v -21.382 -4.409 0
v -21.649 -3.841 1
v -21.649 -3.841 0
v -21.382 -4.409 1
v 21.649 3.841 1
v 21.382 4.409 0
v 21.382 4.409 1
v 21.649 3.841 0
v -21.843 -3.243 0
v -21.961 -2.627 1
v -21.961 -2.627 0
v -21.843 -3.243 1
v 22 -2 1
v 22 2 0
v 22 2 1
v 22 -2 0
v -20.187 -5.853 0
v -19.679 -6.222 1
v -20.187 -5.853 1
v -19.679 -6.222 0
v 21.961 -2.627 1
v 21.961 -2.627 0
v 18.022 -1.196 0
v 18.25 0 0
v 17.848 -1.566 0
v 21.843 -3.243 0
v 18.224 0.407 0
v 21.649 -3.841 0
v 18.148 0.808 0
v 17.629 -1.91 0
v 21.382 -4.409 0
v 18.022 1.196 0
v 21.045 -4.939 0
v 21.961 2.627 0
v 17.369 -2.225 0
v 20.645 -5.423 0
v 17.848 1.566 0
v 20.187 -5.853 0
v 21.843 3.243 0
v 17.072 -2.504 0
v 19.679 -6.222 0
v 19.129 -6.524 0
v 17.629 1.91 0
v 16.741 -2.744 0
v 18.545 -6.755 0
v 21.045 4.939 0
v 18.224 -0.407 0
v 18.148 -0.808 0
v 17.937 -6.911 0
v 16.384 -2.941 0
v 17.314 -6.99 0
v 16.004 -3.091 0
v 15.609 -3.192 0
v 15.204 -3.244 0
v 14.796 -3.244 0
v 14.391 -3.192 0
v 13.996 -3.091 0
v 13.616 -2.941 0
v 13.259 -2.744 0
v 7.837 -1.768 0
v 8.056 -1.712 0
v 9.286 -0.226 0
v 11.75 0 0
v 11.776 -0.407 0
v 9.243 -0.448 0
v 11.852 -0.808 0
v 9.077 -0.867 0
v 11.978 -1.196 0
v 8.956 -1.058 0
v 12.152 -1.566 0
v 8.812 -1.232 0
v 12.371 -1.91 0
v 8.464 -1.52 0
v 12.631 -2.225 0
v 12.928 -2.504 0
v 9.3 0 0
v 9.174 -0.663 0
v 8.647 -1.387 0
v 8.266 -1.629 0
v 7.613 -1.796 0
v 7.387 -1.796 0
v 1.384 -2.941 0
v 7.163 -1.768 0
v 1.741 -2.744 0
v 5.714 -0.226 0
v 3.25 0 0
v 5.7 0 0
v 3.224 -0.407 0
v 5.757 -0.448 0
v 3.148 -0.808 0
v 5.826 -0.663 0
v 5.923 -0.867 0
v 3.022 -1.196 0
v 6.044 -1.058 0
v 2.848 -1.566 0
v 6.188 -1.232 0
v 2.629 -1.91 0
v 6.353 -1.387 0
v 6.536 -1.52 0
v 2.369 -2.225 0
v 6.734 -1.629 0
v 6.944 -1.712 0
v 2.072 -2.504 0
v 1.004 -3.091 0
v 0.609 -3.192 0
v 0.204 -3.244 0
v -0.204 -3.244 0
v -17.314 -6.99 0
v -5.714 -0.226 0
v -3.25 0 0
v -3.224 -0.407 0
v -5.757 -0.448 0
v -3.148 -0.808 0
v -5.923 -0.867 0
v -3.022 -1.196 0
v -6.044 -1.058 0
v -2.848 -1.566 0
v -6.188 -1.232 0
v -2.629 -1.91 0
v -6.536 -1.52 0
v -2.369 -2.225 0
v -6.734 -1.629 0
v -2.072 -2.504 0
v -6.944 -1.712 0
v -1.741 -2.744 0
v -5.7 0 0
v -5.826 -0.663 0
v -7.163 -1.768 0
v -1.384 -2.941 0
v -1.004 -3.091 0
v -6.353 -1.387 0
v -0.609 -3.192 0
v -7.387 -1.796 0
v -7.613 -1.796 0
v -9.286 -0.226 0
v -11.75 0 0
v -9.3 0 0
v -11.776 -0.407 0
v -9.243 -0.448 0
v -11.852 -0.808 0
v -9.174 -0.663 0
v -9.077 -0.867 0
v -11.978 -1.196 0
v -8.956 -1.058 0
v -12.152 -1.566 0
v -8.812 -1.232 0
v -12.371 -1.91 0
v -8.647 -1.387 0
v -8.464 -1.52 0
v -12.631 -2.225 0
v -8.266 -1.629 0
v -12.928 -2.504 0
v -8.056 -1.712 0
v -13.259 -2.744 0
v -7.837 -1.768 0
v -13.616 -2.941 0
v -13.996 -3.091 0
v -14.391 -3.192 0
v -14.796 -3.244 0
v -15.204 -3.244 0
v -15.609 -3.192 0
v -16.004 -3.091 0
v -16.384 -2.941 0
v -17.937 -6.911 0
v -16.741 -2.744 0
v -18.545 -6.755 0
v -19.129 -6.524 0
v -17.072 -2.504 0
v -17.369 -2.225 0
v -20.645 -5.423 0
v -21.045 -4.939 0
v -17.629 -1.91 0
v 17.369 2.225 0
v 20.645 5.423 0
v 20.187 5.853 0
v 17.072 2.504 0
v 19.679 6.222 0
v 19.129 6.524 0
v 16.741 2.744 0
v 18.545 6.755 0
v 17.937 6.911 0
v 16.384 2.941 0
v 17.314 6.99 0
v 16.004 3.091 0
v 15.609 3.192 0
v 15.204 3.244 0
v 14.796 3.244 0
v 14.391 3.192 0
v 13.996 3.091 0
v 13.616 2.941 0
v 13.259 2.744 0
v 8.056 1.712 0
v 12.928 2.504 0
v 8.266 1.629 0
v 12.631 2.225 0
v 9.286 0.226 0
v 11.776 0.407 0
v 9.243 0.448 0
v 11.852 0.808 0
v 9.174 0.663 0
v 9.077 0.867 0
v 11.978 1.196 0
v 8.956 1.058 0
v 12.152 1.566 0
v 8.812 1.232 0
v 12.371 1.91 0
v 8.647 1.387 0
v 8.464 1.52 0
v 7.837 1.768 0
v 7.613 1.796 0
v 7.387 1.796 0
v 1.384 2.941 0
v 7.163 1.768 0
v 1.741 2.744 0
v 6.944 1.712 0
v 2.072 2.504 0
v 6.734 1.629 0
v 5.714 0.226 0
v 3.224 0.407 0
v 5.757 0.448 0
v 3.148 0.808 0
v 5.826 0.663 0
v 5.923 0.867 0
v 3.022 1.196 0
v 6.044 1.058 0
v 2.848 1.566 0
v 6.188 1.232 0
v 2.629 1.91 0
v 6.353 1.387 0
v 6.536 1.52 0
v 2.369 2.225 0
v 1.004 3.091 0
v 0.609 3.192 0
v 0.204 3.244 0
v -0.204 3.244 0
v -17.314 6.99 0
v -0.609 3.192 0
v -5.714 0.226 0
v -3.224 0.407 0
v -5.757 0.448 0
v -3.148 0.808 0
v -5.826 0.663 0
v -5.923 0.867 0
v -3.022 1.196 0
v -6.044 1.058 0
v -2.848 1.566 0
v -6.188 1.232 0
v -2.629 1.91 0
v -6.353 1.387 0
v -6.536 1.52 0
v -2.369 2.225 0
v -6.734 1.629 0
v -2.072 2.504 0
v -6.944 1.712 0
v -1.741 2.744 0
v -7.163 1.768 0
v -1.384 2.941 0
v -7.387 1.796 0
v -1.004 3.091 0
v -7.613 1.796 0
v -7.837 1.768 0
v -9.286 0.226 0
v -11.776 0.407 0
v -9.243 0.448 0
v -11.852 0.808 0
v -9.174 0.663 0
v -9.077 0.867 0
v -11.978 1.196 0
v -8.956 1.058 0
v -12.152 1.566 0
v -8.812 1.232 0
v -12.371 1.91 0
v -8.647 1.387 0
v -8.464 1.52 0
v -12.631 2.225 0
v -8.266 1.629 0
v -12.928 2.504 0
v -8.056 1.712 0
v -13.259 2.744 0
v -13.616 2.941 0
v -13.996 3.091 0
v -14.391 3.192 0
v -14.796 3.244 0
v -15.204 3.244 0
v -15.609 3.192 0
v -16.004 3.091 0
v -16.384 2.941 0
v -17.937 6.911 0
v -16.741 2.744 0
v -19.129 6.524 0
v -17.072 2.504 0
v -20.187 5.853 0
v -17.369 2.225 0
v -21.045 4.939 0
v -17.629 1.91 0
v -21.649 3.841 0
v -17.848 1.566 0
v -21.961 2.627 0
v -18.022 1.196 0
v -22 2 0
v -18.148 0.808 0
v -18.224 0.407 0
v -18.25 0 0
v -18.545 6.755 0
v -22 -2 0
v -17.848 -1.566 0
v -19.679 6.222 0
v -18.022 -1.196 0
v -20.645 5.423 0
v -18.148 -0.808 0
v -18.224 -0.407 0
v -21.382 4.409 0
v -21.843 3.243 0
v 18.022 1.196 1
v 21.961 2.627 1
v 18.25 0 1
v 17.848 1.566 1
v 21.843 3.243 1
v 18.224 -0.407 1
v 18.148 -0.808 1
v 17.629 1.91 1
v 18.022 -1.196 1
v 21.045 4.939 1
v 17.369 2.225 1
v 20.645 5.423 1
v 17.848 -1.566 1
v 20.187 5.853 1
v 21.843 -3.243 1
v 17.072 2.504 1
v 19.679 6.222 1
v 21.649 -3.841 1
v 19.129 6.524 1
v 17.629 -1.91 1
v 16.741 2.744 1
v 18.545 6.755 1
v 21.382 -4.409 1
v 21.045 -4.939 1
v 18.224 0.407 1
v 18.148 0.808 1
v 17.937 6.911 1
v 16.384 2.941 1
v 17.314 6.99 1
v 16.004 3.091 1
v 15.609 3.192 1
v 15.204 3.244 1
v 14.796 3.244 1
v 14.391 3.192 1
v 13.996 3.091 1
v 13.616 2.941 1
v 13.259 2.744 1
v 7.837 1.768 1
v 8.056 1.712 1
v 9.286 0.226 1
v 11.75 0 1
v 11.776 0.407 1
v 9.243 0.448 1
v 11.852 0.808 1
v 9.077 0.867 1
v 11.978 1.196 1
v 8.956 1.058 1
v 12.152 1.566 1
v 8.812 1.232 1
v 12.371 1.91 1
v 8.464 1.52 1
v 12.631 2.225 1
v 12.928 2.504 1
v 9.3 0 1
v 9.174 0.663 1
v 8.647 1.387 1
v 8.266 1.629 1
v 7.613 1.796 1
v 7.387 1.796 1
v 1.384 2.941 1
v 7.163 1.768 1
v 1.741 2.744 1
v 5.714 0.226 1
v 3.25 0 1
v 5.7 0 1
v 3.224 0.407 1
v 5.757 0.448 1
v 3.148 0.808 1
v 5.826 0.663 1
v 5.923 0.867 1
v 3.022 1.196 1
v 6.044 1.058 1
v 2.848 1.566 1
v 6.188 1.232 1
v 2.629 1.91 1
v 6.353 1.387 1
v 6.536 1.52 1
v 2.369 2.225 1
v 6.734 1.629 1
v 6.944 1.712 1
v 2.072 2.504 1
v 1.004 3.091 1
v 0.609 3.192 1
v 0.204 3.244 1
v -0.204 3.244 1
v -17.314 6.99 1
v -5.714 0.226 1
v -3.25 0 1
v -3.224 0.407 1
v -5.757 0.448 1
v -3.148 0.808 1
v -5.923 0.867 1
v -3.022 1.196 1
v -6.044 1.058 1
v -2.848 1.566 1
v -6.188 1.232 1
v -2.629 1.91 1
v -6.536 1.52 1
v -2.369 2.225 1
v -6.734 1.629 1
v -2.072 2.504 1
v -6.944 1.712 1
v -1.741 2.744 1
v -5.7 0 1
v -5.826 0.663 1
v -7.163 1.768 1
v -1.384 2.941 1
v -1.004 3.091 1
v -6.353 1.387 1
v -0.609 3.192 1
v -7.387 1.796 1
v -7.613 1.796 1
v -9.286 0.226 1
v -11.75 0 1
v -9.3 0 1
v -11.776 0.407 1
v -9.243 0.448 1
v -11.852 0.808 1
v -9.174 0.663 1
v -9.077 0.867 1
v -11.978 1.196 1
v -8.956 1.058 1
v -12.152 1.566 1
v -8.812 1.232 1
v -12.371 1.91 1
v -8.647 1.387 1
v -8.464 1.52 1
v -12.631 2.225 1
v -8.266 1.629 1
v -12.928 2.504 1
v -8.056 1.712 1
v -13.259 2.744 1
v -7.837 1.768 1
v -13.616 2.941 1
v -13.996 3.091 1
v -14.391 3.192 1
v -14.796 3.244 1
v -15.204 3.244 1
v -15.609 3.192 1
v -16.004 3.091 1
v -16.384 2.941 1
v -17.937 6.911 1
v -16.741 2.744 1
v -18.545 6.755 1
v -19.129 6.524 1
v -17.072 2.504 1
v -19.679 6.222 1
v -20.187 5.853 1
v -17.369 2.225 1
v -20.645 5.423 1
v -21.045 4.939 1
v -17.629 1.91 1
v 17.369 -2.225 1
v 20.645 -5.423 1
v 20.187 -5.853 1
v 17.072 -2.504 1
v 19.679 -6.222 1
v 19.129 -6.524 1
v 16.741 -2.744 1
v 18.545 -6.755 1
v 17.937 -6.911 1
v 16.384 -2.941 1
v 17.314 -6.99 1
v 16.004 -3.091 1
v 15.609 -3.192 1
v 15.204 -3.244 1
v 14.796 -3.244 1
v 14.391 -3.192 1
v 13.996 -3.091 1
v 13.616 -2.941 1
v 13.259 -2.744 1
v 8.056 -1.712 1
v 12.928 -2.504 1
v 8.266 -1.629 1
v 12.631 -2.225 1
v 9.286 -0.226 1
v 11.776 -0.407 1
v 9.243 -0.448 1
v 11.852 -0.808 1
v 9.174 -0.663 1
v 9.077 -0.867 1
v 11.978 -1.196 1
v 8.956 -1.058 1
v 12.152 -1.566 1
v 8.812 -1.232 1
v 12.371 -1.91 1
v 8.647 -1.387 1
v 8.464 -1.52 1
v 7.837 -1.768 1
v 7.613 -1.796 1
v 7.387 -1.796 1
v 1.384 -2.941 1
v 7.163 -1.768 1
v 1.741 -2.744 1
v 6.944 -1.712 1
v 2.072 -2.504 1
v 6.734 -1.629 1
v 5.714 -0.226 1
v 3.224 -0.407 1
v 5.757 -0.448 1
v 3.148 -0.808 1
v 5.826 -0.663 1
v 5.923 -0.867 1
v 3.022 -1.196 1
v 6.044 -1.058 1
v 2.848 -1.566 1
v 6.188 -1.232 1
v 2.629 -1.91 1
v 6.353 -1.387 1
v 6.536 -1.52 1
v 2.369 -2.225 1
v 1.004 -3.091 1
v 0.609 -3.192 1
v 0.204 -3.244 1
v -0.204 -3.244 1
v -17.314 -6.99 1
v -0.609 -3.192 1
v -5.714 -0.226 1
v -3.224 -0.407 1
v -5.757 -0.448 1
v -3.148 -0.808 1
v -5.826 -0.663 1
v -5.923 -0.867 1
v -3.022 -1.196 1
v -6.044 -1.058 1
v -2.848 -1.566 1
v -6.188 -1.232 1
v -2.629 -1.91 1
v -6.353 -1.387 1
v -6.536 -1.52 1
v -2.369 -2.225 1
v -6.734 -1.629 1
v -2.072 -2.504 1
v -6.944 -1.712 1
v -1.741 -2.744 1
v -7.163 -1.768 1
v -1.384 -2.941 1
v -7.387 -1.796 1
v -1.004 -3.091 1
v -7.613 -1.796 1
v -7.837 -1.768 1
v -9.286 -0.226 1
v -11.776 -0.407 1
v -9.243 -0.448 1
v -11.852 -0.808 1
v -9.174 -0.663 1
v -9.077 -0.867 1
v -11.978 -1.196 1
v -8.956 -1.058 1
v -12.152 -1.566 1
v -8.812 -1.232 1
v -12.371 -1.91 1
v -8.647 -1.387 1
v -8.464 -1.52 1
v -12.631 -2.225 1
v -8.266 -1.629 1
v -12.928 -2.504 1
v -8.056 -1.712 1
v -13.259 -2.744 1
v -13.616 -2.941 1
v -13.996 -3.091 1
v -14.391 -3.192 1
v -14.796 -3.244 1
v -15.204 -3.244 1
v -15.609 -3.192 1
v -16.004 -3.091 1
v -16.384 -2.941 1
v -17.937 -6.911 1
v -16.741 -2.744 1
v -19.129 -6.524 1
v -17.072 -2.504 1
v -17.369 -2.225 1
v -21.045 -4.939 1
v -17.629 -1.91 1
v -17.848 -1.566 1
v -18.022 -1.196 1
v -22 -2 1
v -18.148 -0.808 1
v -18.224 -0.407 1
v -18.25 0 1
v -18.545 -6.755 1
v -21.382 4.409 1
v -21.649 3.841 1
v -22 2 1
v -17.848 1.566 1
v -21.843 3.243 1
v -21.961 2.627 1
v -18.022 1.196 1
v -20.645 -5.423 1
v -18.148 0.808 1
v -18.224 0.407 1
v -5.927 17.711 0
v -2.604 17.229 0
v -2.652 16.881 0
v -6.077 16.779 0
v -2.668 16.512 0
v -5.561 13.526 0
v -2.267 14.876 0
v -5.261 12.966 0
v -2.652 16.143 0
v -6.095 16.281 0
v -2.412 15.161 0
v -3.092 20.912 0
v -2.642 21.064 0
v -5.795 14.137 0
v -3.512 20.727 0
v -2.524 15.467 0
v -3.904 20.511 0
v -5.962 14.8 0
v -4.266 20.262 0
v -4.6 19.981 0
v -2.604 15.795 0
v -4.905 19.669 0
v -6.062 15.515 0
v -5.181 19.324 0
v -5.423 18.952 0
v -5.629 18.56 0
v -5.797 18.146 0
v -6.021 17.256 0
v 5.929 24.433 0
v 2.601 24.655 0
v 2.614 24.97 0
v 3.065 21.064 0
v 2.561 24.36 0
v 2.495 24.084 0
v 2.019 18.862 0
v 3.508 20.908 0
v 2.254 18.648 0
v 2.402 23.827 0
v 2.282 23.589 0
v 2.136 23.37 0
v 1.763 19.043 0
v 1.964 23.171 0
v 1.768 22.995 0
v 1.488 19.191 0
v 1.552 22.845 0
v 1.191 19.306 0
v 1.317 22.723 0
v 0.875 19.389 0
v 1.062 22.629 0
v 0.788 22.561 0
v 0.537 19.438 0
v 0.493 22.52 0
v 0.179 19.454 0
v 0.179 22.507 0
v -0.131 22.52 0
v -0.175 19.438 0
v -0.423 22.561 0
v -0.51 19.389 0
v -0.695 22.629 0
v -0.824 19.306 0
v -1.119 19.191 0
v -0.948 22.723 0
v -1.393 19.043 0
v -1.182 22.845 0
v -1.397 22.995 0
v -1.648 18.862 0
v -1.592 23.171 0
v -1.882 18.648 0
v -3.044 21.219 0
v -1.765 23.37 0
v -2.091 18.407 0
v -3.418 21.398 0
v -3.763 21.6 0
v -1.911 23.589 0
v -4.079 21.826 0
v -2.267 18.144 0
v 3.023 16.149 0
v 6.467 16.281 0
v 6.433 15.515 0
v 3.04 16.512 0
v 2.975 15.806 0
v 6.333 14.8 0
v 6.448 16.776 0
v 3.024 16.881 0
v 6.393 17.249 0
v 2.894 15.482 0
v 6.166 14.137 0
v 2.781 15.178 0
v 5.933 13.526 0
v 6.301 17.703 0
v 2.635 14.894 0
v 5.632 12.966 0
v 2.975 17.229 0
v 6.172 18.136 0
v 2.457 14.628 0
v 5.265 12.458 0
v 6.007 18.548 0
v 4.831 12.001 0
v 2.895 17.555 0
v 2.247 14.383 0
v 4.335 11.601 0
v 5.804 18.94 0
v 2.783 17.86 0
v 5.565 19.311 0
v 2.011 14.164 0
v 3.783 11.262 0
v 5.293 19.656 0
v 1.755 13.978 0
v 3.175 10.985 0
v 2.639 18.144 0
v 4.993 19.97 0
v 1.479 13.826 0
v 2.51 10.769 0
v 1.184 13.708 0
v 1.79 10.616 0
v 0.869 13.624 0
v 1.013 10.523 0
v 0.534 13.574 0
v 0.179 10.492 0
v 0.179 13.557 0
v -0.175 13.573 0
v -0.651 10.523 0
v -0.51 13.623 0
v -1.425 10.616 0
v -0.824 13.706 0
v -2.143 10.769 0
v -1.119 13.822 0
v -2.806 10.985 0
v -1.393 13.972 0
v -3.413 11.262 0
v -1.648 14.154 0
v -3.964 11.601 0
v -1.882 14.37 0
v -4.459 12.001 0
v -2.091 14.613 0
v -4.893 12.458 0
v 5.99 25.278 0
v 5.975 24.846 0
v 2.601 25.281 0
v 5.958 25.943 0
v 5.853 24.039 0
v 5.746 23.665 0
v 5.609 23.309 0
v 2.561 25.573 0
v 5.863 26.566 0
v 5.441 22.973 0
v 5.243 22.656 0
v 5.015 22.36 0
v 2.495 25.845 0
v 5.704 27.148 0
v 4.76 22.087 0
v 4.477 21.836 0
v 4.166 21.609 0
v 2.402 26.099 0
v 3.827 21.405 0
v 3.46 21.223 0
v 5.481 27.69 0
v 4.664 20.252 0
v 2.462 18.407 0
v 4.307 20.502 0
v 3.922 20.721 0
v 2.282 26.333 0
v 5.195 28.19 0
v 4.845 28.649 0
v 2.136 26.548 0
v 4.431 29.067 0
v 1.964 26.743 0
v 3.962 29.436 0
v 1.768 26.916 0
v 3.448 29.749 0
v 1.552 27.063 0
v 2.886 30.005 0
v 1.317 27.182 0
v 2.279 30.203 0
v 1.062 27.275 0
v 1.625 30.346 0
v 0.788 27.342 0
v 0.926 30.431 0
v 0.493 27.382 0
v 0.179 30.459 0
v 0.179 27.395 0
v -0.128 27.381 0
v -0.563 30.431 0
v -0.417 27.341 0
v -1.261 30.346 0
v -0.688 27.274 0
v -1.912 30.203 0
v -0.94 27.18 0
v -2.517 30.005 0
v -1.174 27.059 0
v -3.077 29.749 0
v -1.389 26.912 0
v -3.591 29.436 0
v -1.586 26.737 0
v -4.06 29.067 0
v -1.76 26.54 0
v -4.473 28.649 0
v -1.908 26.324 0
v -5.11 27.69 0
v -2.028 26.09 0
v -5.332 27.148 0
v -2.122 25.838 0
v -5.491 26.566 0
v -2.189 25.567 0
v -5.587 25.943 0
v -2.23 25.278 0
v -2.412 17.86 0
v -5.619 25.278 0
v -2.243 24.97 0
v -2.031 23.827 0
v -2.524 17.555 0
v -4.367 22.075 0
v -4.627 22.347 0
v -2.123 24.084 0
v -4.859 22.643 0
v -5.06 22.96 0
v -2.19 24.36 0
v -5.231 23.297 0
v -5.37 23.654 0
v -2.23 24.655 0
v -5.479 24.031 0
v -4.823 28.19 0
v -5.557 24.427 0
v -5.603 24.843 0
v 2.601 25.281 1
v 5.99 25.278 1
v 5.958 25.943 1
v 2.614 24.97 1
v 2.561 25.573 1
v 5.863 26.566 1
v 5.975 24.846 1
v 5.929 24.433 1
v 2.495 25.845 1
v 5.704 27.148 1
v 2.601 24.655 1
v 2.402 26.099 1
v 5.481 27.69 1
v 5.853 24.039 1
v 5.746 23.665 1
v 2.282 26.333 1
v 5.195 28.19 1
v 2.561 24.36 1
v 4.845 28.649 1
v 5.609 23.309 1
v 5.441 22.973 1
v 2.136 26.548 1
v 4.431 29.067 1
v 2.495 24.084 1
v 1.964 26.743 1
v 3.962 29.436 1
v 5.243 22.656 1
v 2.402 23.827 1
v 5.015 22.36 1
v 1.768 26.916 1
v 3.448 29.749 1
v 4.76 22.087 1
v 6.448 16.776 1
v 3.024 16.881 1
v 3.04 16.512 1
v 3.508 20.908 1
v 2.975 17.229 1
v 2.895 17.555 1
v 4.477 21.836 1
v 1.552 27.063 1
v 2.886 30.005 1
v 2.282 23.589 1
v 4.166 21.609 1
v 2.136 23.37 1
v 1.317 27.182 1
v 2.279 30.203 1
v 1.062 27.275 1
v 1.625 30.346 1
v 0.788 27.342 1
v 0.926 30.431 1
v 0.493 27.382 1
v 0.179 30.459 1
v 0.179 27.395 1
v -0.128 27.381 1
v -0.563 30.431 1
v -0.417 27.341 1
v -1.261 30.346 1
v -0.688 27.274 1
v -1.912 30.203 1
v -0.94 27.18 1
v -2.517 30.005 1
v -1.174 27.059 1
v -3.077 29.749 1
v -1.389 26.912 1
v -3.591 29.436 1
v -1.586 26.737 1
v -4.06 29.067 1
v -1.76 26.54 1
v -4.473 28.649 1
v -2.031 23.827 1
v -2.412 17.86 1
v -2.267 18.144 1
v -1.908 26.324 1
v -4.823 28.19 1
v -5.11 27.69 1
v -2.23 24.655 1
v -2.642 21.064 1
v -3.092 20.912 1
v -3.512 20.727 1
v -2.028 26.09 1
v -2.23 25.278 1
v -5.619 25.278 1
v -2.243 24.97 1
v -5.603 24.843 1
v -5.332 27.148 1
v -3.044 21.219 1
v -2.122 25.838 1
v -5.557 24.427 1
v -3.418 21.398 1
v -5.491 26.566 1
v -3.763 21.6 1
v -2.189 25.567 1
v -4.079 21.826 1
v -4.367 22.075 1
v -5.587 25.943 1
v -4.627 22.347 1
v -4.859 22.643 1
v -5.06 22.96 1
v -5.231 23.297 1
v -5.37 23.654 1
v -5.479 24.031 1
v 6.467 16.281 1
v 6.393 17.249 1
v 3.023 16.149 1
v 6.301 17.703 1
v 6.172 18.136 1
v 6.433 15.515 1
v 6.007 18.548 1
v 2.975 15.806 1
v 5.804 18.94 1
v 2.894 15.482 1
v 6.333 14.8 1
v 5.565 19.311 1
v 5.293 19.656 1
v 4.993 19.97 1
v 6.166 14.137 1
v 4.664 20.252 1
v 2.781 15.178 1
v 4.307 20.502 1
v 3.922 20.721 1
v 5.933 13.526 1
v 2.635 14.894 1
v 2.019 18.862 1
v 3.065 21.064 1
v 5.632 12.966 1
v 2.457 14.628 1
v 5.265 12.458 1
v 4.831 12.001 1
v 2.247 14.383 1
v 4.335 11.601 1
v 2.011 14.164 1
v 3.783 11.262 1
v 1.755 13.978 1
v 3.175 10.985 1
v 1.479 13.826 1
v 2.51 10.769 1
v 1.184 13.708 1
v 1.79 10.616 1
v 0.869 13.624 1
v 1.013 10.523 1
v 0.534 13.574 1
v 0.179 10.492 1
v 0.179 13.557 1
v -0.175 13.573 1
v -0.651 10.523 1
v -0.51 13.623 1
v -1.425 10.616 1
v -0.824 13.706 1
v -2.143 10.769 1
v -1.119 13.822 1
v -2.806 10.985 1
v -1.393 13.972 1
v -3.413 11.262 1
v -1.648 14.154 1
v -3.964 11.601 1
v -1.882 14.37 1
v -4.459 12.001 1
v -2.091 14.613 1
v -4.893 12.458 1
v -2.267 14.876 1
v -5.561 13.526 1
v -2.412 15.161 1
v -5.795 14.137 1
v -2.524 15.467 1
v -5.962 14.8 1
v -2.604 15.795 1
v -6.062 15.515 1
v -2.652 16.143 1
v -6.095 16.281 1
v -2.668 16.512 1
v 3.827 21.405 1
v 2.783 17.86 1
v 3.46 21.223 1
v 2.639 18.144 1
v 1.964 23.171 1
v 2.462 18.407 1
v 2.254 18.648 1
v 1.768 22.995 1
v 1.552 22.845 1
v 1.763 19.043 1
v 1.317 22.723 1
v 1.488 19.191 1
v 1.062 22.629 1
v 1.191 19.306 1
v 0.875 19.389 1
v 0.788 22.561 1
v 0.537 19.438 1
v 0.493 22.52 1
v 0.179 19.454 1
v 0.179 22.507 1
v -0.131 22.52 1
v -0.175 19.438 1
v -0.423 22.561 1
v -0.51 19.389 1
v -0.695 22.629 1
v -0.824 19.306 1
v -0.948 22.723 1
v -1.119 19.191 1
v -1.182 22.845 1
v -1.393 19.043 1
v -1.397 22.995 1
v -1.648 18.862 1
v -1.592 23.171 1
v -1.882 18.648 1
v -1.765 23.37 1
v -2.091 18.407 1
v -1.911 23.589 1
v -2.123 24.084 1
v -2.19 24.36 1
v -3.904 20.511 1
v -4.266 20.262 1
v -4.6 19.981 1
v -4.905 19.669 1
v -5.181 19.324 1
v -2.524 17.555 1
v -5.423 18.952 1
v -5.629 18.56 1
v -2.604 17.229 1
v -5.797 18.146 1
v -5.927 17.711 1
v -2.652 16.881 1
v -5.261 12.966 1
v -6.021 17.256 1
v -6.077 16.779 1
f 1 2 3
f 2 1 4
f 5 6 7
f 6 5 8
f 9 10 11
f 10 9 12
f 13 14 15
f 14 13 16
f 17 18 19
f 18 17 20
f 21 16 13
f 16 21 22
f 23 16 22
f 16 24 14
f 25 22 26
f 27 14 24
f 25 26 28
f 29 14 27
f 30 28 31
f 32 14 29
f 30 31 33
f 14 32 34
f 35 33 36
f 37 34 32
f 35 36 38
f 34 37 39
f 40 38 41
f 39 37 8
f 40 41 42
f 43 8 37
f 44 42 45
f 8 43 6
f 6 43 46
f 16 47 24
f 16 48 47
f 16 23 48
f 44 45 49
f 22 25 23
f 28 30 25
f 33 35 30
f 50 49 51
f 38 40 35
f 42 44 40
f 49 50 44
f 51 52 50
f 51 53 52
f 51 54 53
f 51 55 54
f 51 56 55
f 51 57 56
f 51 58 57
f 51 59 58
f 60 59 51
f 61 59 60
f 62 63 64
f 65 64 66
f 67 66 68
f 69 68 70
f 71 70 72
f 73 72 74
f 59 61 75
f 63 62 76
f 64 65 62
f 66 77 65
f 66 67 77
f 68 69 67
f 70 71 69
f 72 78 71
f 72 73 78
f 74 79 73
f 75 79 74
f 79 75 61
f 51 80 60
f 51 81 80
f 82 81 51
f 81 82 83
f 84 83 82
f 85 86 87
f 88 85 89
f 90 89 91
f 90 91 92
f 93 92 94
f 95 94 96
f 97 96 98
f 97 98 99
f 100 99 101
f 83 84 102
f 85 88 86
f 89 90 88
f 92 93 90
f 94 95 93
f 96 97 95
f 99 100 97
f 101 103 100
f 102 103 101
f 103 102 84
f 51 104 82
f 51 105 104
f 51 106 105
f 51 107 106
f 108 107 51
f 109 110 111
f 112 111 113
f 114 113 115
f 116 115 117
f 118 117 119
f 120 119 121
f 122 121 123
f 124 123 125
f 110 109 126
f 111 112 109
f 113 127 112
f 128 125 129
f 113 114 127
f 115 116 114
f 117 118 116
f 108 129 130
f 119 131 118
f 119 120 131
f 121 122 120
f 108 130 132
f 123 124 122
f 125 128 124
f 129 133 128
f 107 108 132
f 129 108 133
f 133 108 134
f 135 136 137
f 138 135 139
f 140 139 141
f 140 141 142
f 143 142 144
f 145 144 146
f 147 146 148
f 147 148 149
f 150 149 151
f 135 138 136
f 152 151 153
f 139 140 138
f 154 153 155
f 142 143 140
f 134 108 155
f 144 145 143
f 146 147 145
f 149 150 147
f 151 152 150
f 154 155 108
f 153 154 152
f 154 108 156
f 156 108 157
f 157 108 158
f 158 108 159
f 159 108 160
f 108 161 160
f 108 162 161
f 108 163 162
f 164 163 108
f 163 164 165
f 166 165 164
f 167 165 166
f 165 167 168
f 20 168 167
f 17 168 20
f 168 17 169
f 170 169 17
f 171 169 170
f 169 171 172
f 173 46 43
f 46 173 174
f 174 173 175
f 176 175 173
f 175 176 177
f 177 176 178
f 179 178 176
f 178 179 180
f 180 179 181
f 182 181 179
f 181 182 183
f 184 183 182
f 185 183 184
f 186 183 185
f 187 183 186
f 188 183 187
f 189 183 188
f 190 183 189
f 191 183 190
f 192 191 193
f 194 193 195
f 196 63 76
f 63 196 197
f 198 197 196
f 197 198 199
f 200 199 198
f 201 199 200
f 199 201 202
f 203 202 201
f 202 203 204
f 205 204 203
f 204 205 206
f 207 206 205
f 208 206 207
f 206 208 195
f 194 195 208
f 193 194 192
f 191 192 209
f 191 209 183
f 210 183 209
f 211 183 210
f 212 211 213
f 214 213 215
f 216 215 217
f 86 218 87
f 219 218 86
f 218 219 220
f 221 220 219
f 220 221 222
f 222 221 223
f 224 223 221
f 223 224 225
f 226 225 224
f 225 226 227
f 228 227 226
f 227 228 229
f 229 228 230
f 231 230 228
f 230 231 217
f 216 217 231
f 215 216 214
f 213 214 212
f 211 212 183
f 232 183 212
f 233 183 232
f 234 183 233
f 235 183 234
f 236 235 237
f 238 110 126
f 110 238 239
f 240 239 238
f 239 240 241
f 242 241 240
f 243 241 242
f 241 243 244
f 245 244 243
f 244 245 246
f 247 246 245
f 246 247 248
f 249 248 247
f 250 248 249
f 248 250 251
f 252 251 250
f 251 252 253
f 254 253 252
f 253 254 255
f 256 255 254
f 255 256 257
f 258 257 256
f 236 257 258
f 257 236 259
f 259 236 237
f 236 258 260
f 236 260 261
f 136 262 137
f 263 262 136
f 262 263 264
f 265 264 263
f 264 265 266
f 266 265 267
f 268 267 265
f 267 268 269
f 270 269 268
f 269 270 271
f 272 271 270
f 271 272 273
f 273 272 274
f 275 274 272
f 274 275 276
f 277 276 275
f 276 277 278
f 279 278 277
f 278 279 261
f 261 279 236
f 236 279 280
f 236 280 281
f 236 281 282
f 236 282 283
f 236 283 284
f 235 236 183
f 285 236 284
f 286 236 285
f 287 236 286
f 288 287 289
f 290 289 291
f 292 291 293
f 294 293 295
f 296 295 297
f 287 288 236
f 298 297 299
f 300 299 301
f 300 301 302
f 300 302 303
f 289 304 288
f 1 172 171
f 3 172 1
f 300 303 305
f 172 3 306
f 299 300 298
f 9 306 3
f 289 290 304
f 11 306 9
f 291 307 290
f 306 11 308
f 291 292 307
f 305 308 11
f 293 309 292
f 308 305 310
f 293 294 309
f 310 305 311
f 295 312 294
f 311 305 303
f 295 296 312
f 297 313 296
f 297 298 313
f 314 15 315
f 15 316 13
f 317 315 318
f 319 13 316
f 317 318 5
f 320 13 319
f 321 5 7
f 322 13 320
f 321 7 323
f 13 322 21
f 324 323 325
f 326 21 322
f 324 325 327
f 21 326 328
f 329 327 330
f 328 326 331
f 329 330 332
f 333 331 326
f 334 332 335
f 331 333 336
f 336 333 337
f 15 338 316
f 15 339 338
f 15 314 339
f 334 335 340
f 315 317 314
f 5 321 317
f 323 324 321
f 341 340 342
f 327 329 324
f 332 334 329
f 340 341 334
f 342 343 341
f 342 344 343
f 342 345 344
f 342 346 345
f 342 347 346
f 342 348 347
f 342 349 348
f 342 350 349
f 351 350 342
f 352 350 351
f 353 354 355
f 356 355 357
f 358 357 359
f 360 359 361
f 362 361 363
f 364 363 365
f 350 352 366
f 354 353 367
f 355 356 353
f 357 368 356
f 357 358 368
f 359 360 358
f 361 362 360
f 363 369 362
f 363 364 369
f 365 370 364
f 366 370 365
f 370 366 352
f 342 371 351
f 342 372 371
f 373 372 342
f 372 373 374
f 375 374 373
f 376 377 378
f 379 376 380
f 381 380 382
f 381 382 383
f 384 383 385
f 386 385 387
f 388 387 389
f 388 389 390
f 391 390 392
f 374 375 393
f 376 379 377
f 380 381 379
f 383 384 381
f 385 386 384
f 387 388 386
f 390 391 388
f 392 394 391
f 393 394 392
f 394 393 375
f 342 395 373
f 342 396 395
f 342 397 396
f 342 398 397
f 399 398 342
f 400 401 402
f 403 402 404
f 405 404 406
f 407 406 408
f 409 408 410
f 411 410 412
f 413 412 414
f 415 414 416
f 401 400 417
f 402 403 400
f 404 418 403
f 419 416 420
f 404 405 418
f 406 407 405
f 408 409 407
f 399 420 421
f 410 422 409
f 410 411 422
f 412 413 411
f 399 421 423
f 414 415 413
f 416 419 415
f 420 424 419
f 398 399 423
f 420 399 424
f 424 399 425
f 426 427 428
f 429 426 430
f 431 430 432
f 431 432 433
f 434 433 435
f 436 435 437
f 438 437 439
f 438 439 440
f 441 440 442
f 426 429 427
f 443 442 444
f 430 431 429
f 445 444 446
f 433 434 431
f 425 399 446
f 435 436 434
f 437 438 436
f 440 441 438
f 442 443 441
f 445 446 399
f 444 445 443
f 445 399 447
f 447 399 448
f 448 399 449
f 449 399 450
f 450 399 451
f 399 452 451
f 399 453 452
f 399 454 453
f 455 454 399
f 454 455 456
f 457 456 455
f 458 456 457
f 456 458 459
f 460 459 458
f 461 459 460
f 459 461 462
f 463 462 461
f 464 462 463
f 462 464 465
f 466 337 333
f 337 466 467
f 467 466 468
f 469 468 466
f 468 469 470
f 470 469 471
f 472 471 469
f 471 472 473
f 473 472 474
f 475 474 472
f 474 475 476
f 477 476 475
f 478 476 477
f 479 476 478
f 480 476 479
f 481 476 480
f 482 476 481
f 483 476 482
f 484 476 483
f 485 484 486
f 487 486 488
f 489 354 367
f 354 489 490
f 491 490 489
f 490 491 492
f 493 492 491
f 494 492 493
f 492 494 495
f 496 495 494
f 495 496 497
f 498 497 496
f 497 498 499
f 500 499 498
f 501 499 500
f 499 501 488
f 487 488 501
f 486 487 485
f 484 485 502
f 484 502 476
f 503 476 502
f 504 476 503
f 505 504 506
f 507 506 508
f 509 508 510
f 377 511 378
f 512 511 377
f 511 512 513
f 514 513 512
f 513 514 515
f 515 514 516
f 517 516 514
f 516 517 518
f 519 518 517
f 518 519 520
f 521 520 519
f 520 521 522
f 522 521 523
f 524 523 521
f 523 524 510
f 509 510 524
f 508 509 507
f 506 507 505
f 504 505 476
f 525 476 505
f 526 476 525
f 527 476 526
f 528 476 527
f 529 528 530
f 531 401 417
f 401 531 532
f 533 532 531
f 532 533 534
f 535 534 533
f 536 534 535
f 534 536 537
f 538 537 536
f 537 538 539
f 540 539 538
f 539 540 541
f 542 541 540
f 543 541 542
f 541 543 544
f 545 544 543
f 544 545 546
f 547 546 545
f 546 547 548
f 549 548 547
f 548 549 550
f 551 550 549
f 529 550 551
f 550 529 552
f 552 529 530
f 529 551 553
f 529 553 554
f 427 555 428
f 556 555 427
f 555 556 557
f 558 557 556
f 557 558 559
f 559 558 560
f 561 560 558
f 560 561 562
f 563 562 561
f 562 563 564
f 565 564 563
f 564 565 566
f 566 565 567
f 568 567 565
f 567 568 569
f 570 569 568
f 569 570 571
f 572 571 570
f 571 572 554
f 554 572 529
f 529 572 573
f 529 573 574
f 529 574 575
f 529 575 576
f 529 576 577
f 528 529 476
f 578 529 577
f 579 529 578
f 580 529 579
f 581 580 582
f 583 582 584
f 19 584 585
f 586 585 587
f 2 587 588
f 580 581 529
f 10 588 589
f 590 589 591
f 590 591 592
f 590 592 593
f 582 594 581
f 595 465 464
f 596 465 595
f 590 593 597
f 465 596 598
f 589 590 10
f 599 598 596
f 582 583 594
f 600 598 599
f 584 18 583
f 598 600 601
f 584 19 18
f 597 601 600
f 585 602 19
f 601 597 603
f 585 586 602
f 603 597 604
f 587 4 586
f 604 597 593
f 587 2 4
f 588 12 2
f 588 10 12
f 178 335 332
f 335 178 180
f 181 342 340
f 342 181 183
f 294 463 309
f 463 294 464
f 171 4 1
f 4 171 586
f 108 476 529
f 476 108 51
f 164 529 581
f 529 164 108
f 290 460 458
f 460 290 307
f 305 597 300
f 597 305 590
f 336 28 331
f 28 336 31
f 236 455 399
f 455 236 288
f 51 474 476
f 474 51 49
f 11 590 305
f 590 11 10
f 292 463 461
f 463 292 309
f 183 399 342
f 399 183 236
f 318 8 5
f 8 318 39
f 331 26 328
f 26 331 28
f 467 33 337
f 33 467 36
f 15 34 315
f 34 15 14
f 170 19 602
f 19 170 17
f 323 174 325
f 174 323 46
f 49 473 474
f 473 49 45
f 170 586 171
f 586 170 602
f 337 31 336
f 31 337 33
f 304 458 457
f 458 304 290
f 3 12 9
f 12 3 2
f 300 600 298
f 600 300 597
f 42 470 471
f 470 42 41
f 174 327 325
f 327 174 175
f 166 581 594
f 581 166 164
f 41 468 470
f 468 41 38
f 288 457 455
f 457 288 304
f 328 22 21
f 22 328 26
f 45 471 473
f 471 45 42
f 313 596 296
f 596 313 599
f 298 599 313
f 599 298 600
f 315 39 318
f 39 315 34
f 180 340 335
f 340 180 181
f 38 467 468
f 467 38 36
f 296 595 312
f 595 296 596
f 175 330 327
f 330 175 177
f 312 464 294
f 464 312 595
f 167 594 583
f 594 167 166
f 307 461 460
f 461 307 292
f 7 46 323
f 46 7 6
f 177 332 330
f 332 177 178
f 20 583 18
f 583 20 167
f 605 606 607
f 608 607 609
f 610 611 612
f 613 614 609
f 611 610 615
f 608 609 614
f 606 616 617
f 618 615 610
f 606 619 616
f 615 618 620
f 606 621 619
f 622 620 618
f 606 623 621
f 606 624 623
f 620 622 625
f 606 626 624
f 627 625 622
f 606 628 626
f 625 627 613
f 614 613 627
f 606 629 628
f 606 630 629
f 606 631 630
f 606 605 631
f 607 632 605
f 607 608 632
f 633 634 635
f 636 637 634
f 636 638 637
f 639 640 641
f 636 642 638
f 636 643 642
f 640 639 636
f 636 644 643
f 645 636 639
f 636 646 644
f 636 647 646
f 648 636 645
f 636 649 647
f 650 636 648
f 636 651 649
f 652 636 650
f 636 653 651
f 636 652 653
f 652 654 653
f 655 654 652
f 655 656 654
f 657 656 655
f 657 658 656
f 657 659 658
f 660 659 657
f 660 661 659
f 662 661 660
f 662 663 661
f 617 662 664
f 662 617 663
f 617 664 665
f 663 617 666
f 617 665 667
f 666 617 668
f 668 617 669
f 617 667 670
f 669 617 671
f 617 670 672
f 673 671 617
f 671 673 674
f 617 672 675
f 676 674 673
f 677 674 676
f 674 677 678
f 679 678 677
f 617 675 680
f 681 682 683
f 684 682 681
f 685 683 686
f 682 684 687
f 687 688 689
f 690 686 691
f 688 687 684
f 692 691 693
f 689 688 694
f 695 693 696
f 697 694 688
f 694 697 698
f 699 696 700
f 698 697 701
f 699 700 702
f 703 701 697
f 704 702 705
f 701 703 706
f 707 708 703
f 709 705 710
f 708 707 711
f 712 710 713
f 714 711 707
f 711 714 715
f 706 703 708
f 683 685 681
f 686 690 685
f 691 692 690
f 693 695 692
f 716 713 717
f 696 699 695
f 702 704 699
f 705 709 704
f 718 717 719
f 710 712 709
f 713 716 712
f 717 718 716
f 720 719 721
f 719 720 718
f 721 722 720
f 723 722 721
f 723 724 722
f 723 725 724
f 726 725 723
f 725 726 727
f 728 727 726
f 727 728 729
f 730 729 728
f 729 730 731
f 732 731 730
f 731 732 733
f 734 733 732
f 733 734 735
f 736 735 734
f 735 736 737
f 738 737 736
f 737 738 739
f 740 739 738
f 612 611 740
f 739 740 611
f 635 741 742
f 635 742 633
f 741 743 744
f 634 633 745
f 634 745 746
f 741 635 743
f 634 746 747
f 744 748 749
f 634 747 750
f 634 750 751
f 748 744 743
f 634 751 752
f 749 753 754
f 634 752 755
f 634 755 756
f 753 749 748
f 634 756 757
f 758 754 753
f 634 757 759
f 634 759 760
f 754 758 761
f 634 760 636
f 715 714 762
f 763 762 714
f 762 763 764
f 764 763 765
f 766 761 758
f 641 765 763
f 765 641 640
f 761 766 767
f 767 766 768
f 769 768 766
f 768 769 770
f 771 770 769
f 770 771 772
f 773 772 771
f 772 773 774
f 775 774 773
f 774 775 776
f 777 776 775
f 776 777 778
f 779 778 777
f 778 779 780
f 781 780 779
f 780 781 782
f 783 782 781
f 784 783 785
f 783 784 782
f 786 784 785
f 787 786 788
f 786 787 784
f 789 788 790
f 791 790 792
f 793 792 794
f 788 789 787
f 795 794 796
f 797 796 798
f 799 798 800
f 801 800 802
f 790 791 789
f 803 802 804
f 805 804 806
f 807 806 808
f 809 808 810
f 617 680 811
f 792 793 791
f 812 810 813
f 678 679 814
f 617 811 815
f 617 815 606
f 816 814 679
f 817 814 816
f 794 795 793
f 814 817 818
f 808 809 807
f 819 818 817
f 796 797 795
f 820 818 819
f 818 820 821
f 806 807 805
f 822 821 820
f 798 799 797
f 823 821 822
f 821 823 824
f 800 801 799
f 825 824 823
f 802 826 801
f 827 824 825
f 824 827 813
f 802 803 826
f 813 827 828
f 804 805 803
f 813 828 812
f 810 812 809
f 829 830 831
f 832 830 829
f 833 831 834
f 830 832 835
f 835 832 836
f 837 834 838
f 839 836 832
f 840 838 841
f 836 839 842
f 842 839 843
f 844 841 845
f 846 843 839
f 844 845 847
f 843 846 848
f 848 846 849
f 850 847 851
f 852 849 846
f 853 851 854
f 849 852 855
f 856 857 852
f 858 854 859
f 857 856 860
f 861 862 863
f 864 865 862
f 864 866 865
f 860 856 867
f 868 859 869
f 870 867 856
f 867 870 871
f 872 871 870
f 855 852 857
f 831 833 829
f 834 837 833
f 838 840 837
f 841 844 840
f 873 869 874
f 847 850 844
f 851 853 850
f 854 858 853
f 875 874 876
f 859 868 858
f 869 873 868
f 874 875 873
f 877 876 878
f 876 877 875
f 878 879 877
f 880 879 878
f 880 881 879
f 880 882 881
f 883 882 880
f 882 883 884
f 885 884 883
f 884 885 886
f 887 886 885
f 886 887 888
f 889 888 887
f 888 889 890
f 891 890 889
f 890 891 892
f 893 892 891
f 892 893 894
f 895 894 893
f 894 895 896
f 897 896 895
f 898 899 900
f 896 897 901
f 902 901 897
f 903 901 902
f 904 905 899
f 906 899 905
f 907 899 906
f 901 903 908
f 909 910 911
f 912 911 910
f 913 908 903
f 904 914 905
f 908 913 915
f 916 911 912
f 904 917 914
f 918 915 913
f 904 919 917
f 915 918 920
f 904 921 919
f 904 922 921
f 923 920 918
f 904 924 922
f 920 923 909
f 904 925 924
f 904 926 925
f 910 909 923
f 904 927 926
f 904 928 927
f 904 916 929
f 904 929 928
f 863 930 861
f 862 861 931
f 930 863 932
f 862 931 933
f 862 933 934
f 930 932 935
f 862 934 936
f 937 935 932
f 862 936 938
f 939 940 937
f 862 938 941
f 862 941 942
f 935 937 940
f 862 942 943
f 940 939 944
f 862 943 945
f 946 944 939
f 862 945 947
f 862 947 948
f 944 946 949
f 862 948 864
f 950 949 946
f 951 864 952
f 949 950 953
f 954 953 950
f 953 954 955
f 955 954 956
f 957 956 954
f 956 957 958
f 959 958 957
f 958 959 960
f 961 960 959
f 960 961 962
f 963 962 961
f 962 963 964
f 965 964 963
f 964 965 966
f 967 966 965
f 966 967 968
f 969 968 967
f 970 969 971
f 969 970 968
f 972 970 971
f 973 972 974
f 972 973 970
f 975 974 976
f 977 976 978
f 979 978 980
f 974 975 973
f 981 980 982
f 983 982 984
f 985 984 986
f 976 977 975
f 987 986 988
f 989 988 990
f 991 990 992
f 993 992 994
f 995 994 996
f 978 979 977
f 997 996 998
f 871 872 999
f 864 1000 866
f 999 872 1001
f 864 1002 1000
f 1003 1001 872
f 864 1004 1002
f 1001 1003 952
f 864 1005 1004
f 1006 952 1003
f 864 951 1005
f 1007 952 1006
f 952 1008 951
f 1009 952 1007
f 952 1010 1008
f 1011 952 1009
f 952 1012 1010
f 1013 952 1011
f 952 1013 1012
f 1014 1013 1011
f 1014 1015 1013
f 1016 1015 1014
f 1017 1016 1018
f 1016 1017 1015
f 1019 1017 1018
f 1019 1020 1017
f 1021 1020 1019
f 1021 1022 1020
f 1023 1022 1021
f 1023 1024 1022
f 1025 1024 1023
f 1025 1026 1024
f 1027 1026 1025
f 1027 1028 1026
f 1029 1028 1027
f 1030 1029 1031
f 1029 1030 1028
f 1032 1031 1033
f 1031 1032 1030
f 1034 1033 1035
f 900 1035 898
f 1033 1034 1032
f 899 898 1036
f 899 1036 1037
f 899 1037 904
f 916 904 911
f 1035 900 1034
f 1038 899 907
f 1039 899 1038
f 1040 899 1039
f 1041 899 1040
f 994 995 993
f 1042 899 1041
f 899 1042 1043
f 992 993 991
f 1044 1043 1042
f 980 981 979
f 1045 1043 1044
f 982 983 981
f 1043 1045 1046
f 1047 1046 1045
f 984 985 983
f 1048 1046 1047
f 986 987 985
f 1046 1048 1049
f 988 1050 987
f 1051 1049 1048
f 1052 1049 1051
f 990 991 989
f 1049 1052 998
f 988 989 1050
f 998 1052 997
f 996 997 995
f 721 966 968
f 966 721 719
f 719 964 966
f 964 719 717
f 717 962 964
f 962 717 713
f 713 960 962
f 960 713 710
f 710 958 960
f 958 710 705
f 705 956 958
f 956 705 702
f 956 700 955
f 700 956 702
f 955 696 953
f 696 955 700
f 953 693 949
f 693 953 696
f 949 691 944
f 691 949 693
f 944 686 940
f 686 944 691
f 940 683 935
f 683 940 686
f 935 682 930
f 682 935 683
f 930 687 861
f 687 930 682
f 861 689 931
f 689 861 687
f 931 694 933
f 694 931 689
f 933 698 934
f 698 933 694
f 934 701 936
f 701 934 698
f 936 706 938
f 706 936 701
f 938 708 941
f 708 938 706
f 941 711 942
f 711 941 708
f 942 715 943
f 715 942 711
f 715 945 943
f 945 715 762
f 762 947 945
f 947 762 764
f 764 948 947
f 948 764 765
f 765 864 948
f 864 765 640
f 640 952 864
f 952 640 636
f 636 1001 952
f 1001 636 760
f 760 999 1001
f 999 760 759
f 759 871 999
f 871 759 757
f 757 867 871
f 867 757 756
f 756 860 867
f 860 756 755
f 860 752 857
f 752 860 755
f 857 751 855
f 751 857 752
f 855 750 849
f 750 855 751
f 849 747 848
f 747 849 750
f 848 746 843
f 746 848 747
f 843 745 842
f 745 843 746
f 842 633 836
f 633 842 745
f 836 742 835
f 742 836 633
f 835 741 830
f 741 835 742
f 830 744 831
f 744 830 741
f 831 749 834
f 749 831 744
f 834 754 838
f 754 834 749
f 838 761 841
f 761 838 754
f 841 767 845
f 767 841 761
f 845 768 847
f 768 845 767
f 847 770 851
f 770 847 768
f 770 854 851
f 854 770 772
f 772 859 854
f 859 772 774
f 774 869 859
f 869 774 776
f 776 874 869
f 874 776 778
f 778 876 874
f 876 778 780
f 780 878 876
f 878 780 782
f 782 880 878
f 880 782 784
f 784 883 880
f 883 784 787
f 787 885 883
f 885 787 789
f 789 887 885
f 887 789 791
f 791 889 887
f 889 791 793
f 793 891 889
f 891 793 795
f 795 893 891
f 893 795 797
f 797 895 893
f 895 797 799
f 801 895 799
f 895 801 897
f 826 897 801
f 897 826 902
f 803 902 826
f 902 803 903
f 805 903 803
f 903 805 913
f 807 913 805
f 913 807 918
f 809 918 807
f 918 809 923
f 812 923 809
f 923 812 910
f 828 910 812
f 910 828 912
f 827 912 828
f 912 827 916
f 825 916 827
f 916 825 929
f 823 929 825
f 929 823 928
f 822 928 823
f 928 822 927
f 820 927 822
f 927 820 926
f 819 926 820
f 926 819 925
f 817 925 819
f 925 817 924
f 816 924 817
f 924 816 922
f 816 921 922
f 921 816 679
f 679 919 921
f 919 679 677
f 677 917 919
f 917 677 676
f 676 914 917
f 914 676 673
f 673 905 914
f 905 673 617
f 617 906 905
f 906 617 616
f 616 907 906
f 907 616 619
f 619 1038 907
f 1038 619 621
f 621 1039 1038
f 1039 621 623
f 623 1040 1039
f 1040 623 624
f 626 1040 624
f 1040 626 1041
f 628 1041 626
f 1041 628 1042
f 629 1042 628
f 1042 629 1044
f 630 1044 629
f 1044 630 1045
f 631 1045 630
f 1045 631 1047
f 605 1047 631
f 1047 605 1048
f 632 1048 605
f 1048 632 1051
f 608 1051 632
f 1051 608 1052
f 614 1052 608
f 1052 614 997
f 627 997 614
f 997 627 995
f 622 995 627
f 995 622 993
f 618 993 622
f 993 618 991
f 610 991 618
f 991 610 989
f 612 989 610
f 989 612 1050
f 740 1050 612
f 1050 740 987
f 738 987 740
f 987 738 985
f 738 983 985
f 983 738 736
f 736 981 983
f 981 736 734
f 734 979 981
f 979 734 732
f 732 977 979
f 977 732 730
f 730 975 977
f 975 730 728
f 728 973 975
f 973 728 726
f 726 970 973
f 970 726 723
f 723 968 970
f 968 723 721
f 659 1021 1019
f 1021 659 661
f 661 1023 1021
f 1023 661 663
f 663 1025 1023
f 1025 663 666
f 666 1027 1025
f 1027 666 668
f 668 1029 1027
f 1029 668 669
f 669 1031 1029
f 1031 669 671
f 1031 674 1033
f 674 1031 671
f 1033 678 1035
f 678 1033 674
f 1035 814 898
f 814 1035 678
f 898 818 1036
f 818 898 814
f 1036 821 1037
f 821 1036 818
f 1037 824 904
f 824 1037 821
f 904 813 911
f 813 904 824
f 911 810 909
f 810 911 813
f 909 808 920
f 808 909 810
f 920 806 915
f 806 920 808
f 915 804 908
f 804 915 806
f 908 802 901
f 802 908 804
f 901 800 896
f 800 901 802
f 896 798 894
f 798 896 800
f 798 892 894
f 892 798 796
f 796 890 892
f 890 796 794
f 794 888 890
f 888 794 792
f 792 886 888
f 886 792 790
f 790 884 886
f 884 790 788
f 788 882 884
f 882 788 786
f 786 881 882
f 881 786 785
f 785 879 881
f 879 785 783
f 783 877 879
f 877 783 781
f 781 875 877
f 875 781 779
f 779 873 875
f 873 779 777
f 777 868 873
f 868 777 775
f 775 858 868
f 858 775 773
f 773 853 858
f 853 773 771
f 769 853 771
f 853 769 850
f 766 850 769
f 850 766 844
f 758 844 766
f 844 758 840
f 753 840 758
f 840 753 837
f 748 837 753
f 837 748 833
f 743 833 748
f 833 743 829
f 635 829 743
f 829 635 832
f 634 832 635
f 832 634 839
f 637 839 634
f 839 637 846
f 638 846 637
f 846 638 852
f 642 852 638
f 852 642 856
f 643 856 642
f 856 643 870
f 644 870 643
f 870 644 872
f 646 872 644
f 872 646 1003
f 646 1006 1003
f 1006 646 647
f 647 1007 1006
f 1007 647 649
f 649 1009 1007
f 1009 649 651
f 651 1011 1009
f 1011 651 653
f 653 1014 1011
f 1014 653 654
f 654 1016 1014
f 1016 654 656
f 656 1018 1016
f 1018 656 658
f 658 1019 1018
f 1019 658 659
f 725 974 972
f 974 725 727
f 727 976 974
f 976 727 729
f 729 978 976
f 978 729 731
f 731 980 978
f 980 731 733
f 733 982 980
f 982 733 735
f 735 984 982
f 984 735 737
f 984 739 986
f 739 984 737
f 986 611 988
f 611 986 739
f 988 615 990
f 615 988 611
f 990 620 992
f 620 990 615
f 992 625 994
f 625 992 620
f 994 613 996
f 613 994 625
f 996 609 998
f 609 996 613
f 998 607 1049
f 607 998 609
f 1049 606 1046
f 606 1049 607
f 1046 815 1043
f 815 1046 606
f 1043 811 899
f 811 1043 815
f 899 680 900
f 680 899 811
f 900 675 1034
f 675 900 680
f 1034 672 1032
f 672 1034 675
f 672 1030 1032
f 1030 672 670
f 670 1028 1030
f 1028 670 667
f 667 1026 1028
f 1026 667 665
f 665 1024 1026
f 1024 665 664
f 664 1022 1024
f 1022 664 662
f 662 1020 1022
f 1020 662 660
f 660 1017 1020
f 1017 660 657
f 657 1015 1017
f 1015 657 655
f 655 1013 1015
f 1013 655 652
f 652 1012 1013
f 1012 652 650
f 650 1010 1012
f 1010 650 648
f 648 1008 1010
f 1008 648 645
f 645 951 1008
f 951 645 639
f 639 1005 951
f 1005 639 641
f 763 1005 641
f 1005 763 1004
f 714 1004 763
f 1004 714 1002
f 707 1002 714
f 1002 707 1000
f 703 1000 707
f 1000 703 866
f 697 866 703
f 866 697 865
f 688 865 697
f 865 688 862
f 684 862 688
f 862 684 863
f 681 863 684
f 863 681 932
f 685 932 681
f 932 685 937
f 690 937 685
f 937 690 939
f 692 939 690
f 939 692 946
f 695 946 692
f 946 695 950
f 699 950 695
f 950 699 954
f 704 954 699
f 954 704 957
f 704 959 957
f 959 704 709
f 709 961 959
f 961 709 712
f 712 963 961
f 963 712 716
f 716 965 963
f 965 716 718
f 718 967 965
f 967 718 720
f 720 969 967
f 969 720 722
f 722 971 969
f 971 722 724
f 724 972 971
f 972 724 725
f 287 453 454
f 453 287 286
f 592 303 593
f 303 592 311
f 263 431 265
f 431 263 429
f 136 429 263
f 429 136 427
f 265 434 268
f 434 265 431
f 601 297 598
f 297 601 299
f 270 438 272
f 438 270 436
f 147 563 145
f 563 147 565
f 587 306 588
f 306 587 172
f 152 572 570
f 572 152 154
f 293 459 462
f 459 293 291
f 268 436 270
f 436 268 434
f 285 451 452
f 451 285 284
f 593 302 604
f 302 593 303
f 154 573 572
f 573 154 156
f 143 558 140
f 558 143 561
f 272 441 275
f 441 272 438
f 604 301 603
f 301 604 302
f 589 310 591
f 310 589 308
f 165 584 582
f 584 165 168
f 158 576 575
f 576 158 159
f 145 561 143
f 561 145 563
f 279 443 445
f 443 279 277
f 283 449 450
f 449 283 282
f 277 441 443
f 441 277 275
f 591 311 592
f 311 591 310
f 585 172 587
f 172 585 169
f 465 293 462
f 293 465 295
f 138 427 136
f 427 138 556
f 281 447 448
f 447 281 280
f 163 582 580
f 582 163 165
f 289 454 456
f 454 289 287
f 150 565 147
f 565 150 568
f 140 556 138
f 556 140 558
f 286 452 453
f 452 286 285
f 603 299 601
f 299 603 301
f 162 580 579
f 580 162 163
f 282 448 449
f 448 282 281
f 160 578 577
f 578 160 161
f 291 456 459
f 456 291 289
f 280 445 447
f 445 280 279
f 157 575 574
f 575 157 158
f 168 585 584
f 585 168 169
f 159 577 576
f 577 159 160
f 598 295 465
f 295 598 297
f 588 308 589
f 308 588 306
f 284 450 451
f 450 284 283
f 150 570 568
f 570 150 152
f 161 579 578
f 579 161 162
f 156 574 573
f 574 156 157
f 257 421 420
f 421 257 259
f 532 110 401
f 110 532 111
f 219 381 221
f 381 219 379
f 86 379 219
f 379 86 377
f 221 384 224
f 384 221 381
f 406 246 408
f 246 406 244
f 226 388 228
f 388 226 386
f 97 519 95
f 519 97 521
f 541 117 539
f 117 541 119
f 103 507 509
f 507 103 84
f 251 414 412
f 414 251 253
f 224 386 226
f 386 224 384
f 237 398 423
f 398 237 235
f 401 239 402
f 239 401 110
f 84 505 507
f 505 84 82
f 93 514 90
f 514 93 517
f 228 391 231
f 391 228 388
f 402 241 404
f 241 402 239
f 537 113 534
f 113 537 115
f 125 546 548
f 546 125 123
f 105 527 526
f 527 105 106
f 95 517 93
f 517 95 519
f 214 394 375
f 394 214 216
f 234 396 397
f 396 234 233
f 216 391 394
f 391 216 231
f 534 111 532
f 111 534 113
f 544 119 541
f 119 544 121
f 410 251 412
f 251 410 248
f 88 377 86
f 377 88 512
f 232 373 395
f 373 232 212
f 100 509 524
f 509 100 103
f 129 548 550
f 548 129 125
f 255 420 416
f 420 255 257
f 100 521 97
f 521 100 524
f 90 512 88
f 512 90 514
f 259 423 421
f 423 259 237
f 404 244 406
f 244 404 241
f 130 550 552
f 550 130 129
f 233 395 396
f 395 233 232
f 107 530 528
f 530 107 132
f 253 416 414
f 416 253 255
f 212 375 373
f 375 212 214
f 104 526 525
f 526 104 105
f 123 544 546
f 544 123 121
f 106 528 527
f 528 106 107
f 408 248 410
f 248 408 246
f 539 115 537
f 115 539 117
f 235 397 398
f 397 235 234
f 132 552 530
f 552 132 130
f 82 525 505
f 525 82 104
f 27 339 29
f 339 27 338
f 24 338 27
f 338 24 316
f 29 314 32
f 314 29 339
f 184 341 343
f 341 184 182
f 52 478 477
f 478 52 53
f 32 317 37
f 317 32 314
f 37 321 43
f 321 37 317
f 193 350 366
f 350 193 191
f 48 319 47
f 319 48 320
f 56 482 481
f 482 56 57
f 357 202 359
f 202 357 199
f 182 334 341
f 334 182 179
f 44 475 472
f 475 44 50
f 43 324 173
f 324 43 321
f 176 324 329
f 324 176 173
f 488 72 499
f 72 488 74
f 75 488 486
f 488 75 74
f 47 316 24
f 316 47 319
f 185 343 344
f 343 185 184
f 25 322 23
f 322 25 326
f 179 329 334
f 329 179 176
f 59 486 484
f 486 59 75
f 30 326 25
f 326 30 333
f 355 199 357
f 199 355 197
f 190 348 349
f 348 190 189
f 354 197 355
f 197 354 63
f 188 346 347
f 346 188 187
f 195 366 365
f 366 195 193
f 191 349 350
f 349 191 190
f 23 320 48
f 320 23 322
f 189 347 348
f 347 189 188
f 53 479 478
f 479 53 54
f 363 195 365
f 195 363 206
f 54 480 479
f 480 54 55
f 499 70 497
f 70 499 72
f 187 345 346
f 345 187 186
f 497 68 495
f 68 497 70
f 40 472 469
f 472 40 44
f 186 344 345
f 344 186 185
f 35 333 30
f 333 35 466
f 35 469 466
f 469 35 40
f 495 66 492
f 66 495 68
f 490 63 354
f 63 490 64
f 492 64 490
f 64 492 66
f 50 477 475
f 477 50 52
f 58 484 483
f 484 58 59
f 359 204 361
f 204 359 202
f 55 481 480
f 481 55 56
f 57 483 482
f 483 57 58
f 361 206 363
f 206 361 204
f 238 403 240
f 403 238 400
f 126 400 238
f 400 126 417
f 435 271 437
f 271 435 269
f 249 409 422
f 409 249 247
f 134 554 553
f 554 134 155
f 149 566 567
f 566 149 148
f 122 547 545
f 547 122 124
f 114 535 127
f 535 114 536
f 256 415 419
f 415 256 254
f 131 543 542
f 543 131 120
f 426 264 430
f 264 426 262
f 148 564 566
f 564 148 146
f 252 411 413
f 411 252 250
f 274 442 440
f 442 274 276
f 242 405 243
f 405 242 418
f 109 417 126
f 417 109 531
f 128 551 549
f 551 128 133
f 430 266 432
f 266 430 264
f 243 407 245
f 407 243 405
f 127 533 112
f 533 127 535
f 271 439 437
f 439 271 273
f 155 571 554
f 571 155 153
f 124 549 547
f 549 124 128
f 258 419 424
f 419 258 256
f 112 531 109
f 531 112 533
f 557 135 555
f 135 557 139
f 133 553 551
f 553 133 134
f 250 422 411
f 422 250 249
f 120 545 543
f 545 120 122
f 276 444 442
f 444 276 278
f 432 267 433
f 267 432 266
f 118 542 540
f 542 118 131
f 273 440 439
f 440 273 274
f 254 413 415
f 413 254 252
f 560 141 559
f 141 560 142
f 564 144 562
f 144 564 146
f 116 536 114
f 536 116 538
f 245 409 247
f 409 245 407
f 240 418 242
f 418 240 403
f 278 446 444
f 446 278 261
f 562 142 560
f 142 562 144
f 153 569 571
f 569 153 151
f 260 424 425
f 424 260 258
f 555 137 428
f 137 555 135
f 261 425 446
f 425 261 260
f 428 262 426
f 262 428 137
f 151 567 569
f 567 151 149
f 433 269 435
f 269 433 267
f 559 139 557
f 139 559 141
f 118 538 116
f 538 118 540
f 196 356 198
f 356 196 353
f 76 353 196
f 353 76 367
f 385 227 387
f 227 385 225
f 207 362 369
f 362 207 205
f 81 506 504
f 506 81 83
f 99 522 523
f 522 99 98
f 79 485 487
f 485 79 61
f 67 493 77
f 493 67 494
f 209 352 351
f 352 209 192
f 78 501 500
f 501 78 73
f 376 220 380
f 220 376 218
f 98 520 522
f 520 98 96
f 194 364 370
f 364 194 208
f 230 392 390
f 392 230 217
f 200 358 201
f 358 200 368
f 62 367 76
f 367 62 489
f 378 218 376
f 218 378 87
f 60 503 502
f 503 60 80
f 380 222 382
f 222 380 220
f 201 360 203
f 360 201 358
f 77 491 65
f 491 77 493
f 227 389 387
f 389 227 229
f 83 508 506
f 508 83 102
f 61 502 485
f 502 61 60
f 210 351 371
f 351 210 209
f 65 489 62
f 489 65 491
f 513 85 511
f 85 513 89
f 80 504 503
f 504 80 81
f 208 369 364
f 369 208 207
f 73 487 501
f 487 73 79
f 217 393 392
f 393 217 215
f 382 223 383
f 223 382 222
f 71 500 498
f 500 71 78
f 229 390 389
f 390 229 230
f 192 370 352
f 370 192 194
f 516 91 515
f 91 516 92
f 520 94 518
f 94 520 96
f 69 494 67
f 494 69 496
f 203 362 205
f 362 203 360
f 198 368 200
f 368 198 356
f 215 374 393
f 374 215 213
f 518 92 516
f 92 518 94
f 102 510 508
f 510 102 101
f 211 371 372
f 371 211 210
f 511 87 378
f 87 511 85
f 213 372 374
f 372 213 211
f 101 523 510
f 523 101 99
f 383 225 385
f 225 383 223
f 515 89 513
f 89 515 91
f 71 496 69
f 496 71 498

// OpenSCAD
$fn = 50;


difference() {
	union() {
		hull() {
			translate(v = [-17.0000000000, 2.0000000000, 0]) {
				cylinder(h = 1, r = 5);
			}
			translate(v = [17.0000000000, 2.0000000000, 0]) {
				cylinder(h = 1, r = 5);
			}
			translate(v = [-17.0000000000, -2.0000000000, 0]) {
				cylinder(h = 1, r = 5);
			}
			translate(v = [17.0000000000, -2.0000000000, 0]) {
				cylinder(h = 1, r = 5);
			}
		}
		translate(v = [0, 30.0000000000, 0]) {
			linear_extrude(height = 1) {
				text(font = "DejaVu Sans Mono:style=Bold", halign = "center", size = 19.0000000000, text = "8", valign = "top");
			}
		}
	}
	union() {
		translate(v = [-15.0000000000, 0.0000000000, 0]) {
			translate(v = [0, 0, -100]) {
				cylinder(h = 200, r = 3.2500000000);
			}
		}
		translate(v = [0, 0, -100]) {
			cylinder(h = 200, r = 3.2500000000);
		}
		translate(v = [15.0000000000, 0.0000000000, 0]) {
			translate(v = [0, 0, -100]) {
				cylinder(h = 200, r = 3.2500000000);
			}
		}
		translate(v = [-15.0000000000, 0.0000000000, 0]) {
			translate(v = [0, 0, -100]) {
				cylinder(h = 200, r = 1.8000000000);
			}
		}
		translate(v = [-7.5000000000, 0.0000000000, 0]) {
			translate(v = [0, 0, -100]) {
				cylinder(h = 200, r = 1.8000000000);
			}
		}
		translate(v = [0, 0, -100]) {
			cylinder(h = 200, r = 1.8000000000);
		}
		translate(v = [7.5000000000, 0.0000000000, 0]) {
			translate(v = [0, 0, -100]) {
				cylinder(h = 200, r = 1.8000000000);
			}
		}
		translate(v = [15.0000000000, 0.0000000000, 0]) {
			translate(v = [0, 0, -100]) {
				cylinder(h = 200, r = 1.8000000000);
			}
		}
	}
}
